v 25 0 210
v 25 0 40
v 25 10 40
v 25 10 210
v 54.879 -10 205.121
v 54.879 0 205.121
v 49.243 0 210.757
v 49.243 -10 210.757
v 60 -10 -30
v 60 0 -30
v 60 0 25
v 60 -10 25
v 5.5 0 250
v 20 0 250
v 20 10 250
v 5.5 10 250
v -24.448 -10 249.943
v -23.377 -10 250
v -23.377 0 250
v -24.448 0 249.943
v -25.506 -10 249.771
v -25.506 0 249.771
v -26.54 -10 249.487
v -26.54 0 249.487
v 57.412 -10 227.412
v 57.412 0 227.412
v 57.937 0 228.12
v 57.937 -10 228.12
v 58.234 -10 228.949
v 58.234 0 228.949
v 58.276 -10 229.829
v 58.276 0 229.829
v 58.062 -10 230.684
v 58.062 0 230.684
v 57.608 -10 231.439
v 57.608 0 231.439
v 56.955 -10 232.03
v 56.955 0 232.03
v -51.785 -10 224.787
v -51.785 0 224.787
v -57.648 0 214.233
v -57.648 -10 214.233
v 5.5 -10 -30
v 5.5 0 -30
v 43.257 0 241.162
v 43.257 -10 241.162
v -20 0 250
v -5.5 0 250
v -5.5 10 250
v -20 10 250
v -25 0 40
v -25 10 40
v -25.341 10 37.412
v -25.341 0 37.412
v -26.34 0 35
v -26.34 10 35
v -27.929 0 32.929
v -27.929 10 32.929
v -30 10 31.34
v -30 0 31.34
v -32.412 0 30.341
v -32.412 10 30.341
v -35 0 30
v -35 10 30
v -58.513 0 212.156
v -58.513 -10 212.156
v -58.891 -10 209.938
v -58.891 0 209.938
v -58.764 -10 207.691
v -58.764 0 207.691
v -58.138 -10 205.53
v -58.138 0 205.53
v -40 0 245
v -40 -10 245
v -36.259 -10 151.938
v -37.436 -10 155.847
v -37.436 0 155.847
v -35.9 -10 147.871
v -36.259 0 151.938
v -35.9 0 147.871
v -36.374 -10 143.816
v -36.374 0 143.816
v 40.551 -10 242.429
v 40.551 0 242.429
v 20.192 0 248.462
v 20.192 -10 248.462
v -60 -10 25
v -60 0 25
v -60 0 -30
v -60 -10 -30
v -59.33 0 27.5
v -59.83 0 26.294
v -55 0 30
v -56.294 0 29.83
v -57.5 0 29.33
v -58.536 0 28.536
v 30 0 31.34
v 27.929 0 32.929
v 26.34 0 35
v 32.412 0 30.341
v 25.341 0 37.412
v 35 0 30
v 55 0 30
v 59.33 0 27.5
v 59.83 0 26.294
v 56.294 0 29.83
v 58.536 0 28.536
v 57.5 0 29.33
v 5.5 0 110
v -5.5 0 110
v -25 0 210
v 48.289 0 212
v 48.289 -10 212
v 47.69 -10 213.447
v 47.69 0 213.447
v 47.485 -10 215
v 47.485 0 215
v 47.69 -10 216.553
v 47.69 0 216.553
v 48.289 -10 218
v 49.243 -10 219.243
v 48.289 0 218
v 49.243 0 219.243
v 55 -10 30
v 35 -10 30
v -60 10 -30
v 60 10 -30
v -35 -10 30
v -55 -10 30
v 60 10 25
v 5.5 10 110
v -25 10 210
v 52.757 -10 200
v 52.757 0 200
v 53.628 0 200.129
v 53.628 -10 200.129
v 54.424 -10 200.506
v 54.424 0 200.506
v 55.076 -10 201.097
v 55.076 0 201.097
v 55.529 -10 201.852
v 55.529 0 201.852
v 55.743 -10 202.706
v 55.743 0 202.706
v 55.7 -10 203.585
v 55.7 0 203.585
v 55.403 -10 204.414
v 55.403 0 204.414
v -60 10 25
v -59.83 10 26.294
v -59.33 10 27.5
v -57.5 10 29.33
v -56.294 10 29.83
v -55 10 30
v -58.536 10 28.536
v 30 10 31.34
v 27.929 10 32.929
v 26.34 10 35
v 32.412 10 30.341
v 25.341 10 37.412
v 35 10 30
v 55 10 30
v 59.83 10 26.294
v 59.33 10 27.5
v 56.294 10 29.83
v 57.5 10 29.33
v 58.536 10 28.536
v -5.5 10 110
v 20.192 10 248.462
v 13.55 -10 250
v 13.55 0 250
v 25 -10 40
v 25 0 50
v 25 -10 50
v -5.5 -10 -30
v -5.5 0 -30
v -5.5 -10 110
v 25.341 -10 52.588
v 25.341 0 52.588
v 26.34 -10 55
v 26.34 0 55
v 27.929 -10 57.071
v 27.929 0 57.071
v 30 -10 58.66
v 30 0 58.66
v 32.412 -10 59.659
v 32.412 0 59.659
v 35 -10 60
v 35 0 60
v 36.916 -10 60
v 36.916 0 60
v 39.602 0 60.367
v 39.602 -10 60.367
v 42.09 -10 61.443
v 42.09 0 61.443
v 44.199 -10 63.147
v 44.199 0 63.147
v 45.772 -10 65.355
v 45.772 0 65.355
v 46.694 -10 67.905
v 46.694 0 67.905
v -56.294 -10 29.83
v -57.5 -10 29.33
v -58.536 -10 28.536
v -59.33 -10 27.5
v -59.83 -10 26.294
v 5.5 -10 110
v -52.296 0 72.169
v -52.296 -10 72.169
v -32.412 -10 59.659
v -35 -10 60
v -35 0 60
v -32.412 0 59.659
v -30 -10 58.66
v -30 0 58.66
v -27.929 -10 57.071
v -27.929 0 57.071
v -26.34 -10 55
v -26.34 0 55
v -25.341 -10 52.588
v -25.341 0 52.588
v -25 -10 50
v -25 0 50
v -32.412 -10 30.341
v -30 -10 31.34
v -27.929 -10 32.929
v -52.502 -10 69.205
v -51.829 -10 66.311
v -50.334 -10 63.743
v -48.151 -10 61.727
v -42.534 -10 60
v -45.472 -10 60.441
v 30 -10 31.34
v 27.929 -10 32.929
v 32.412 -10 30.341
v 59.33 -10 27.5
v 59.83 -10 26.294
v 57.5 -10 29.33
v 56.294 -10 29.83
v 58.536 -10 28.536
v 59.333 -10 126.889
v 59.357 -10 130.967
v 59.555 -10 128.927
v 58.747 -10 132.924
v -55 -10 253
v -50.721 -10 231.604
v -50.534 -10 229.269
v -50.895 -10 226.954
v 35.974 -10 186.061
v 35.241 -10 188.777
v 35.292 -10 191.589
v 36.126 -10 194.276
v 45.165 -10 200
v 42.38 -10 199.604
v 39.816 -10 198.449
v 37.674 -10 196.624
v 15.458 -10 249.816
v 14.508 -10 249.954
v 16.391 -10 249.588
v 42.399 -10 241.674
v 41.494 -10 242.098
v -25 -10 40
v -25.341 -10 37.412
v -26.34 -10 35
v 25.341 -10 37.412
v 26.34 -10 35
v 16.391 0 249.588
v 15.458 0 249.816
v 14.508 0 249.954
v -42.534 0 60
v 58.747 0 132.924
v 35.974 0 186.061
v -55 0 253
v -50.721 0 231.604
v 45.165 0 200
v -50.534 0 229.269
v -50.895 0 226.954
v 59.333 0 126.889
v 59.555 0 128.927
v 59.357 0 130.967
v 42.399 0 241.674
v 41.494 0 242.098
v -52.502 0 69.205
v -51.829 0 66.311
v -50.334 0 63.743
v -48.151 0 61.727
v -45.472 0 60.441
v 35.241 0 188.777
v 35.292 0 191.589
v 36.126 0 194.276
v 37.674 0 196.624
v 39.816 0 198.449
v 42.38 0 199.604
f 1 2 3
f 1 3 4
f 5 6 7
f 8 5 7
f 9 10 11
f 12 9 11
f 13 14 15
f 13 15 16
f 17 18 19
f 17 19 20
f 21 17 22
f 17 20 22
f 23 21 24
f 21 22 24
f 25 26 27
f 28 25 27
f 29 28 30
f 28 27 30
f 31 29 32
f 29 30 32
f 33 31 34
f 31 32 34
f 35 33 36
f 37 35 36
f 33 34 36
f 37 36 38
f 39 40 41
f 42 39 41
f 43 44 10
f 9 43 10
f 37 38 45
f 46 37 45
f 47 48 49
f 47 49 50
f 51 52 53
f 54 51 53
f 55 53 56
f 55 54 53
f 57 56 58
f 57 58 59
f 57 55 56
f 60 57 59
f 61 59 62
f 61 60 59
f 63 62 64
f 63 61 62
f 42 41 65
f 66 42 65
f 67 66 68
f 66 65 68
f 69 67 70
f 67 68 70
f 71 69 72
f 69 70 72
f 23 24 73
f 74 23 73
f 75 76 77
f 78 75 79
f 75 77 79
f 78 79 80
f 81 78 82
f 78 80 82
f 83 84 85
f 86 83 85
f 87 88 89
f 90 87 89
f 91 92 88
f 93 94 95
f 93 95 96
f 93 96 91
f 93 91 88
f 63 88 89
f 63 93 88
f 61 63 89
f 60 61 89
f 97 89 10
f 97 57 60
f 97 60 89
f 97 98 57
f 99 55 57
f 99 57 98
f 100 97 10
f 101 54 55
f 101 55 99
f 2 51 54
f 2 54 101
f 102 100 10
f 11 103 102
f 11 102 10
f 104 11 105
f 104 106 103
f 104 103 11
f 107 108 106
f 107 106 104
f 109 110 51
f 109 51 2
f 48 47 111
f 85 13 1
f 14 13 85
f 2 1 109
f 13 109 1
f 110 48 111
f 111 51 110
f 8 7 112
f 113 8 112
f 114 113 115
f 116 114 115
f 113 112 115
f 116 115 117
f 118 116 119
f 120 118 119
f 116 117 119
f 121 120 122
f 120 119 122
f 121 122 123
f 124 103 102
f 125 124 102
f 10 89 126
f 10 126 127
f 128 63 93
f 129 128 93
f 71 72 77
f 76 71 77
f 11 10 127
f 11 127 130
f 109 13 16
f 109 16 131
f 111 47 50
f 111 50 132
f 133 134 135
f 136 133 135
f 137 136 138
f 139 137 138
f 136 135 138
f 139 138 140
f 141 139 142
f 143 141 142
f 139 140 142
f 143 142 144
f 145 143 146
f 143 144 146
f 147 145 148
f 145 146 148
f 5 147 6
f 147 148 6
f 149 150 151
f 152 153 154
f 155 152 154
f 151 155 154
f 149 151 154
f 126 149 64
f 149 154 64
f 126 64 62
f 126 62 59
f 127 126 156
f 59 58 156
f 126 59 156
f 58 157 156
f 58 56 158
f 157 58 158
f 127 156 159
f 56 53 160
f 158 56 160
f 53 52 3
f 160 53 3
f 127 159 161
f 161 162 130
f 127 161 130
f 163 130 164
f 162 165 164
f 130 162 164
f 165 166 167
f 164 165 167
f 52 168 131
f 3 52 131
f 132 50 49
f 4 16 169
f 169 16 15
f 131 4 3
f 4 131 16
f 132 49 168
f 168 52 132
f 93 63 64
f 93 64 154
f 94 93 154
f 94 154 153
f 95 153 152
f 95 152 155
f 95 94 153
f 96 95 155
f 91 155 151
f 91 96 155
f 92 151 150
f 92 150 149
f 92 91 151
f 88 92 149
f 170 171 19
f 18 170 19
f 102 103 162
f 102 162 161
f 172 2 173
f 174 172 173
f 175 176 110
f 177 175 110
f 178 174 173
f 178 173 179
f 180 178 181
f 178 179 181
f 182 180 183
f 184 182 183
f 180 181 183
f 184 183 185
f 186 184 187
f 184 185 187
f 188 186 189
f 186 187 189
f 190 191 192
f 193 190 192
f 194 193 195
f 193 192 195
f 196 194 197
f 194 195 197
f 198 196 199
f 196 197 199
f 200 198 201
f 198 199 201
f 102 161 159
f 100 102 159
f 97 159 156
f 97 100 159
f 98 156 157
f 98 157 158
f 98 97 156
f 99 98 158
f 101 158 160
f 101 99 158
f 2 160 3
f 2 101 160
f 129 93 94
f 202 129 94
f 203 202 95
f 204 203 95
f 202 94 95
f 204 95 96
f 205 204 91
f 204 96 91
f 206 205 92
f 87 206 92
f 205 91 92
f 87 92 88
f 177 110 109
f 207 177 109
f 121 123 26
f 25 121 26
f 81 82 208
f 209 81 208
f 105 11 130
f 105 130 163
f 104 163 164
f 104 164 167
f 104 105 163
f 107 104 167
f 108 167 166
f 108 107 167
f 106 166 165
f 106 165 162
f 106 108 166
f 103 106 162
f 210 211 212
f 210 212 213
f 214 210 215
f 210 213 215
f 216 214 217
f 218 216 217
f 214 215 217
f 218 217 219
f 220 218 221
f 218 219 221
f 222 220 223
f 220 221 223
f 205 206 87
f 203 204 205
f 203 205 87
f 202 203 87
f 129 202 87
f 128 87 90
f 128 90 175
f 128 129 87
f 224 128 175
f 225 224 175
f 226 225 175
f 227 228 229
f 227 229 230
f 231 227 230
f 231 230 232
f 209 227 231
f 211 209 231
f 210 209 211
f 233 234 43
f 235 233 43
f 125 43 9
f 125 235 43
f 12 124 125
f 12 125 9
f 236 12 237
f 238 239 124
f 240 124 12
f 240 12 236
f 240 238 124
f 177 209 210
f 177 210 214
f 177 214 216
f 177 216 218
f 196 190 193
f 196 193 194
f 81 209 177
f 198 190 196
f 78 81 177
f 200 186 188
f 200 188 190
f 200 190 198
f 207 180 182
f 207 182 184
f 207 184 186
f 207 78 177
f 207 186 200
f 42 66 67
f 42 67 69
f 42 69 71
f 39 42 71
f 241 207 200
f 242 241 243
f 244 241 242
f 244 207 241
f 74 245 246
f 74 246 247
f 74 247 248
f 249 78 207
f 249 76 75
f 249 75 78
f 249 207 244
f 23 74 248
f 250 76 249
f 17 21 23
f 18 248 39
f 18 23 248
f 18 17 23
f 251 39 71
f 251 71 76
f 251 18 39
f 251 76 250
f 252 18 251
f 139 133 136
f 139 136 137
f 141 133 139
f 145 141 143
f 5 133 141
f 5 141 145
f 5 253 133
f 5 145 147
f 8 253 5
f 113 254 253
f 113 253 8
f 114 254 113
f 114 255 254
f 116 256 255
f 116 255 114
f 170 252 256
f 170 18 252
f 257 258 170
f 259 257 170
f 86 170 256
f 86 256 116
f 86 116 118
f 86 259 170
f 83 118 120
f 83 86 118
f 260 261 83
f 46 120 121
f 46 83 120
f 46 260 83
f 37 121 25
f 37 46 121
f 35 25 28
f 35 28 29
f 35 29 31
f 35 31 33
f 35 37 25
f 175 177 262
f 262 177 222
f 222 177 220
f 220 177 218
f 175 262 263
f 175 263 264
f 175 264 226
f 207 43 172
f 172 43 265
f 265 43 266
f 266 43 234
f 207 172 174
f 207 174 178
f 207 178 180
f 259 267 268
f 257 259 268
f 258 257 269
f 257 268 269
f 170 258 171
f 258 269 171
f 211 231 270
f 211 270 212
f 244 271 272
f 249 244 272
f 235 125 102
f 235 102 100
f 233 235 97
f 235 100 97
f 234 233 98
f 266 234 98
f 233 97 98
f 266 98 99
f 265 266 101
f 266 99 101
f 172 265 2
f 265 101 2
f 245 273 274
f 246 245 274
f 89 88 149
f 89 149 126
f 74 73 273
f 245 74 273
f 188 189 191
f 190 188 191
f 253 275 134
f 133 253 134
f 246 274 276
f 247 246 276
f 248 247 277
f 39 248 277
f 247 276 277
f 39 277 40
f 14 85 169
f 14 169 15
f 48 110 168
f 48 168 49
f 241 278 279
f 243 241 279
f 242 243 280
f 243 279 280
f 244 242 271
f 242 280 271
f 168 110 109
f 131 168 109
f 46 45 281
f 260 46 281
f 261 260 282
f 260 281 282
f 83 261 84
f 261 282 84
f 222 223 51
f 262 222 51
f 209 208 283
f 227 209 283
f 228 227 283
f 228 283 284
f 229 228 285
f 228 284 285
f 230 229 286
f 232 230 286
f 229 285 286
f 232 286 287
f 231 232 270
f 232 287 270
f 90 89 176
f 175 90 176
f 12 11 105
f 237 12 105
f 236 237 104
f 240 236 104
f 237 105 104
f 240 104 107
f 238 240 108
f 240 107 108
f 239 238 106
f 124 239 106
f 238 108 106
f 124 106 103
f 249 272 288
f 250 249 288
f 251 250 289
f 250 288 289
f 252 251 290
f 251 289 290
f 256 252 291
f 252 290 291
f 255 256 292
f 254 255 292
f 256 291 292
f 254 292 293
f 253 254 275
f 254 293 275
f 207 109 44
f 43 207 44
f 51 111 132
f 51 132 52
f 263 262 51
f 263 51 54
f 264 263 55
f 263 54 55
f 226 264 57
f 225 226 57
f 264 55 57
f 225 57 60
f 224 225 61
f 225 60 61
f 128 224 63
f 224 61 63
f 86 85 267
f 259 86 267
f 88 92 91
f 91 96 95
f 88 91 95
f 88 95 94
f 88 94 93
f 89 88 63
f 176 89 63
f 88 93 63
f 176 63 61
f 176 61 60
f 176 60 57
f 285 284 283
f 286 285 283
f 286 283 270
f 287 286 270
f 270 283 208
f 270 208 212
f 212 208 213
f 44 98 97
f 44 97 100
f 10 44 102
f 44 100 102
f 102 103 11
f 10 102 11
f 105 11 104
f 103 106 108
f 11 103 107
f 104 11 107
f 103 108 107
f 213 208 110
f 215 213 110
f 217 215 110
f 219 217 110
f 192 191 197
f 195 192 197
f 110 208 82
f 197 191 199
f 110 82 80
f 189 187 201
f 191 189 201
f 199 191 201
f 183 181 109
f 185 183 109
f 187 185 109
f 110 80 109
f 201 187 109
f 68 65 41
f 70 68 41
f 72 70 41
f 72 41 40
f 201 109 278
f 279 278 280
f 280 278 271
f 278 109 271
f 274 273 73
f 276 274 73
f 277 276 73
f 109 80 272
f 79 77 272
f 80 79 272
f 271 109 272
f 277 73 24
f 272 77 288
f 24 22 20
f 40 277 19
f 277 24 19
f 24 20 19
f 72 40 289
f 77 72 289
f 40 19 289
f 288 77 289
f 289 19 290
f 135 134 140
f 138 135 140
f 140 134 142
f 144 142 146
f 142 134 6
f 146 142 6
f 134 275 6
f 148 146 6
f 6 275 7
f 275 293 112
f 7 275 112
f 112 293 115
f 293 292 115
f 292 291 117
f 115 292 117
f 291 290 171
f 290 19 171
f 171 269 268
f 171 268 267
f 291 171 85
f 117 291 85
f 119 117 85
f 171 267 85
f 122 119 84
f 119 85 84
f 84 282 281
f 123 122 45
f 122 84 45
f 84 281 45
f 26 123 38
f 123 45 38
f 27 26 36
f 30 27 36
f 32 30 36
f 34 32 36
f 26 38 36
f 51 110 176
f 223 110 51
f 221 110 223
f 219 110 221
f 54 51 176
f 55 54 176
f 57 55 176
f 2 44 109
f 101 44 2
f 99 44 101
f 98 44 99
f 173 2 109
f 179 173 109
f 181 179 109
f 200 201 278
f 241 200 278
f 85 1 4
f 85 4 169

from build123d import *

# Parameters (mm, degrees)
F0_W     = 11
F0_H     = 140
F1_DEPTH = 10
F2_DEPTH = 10


with BuildPart() as f1:
    # F0 (on Front) → F1 (new body)
    with BuildSketch(Plane.XZ):
        with BuildLine():
            Line((25, 210), (25, 50))
            ThreePointArc((25, 50), (27.9289321881, 57.0710678119), (35, 60))
            Line((35, 60), (36.9158420977, 60))
            ThreePointArc((36.9158420977, 60), (43.202617548, 62.2233391204), (46.6938662384, 67.9047091127))
            Line((46.6938662384, 67.9047091127), (59.3334554888, 126.8894589477))
            ThreePointArc((59.3334554888, 126.8894589477), (59.5085207702, 129.9522264264), (58.7468816482, 132.9239428208))
            Line((58.7468816482, 132.9239428208), (35.9739398511, 186.0608070142))
            ThreePointArc((35.9739398511, 186.0608070142), (36.8169792289, 195.5049100875), (45.1653901512, 200))
            Line((45.1653901512, 200), (52.7573593129, 200))
            ThreePointArc((52.7573593129, 200), (55.5289979104, 201.8519497029), (54.8786796564, 205.1213203436))
            Line((54.8786796564, 205.1213203436), (49.2426406871, 210.7573593129))
            ThreePointArc((49.2426406871, 210.7573593129), (47.4852813742, 215), (49.2426406871, 219.2426406871))
            Line((49.2426406871, 219.2426406871), (57.412405166, 227.412405166))
            ThreePointArc((57.412405166, 227.412405166), (58.2764848025, 229.8293383635), (56.9551854111, 232.0298763926))
            Line((56.9551854111, 232.0298763926), (43.2572961637, 241.1618025575))
            ThreePointArc((43.2572961637, 241.1618025575), (41.951848164, 241.8971938264), (40.5511774984, 242.4292807412))
            Line((40.5511774984, 242.4292807412), (20.1923076923, 248.4615384615))
            Line((20.1923076923, 248.4615384615), (25, 210))
        make_face()
        with BuildLine():
            Line((-25, 210), (-20, 250))
            Line((-20, 250), (-23.3772233983, 250))
            ThreePointArc((-23.3772233983, 250), (-24.9790458284, 249.8708745764), (-26.5395010585, 249.4868329805))
            Line((-26.5395010585, 249.4868329805), (-40, 245))
            Line((-40, 245), (-55, 253))
            Line((-55, 253), (-50.7208778634, 231.6043893169))
            ThreePointArc((-50.7208778634, 231.6043893169), (-50.6463401243, 228.1008944607), (-51.7851118591, 224.7867986537))
            Line((-51.7851118591, 224.7867986537), (-57.6484155512, 214.2328520078))
            ThreePointArc((-57.6484155512, 214.2328520078), (-58.8910807466, 209.9376645562), (-58.1376120208, 205.5302688499))
            Line((-58.1376120208, 205.5302688499), (-37.4363520563, 155.8472449351))
            ThreePointArc((-37.4363520563, 155.8472449351), (-35.9753879675, 149.9138835563), (-36.3741493141, 143.8163280864))
            Line((-36.3741493141, 143.8163280864), (-52.2957100937, 72.1693045782))
            ThreePointArc((-52.2957100937, 72.1693045782), (-50.3342576147, 63.7427260641), (-42.5338394919, 60))
            Line((-42.5338394919, 60), (-35, 60))
            ThreePointArc((-35, 60), (-27.9289321881, 57.0710678119), (-25, 50))
            Line((-25, 50), (-25, 210))
        make_face()
        with BuildLine():
            Line((-60, -30), (-5.5, -30))
            Line((-5.5, -30), (-5.5, 110))
            Line((-5.5, 110), (-5.5, 250))
            Line((-5.5, 250), (-20, 250))
            Line((-20, 250), (-25, 210))
            Line((-25, 210), (-25, 50))
            Line((-25, 50), (-25, 40))
            ThreePointArc((-25, 40), (-27.9289321881, 32.9289321881), (-35, 30))
            Line((-35, 30), (-55, 30))
            ThreePointArc((-55, 30), (-58.5355339059, 28.5355339059), (-60, 25))
            Line((-60, 25), (-60, -30))
        make_face()
        with Locations((0, 180)):
            Rectangle(F0_W, F0_H)
        with BuildLine():
            ThreePointArc((60, 25), (58.5355339059, 28.5355339059), (55, 30))
            Line((55, 30), (35, 30))
            ThreePointArc((35, 30), (27.9289321881, 32.9289321881), (25, 40))
            Line((25, 40), (25, 50))
            Line((25, 50), (25, 210))
            Line((25, 210), (20.1923076923, 248.4615384615))
            Line((20.1923076923, 248.4615384615), (16.3905636961, 249.5879811271))
            ThreePointArc((16.3905636961, 249.5879811271), (14.9849832817, 249.8964592474), (13.5496803992, 250))
            Line((13.5496803992, 250), (5.5, 250))
            Line((5.5, 250), (5.5, 110))
            Line((5.5, 110), (5.5, -30))
            Line((5.5, -30), (60, -30))
            Line((60, -30), (60, 25))
        make_face()
    extrude(amount=F1_DEPTH)


with BuildPart() as f2:
    # F0 (on Front) → F2 (new body)
    with BuildSketch(Plane.XZ):
        with BuildLine():
            Line((-60, -30), (-5.5, -30))
            Line((-5.5, -30), (-5.5, 110))
            Line((-5.5, 110), (-5.5, 250))
            Line((-5.5, 250), (-20, 250))
            Line((-20, 250), (-25, 210))
            Line((-25, 210), (-25, 50))
            Line((-25, 50), (-25, 40))
            ThreePointArc((-25, 40), (-27.9289321881, 32.9289321881), (-35, 30))
            Line((-35, 30), (-55, 30))
            ThreePointArc((-55, 30), (-58.5355339059, 28.5355339059), (-60, 25))
            Line((-60, 25), (-60, -30))
        make_face()
        with BuildLine():
            ThreePointArc((60, 25), (58.5355339059, 28.5355339059), (55, 30))
            Line((55, 30), (35, 30))
            ThreePointArc((35, 30), (27.9289321881, 32.9289321881), (25, 40))
            Line((25, 40), (25, 50))
            Line((25, 50), (25, 210))
            Line((25, 210), (20.1923076923, 248.4615384615))
            Line((20.1923076923, 248.4615384615), (16.3905636961, 249.5879811271))
            ThreePointArc((16.3905636961, 249.5879811271), (14.9849832817, 249.8964592474), (13.5496803992, 250))
            Line((13.5496803992, 250), (5.5, 250))
            Line((5.5, 250), (5.5, 110))
            Line((5.5, 110), (5.5, -30))
            Line((5.5, -30), (60, -30))
            Line((60, -30), (60, 25))
        make_face()
        with Locations((0, 40)):
            Rectangle(F0_W, F0_H)
        with BuildLine():
            Line((16.3905636961, 249.5879811271), (20.1923076923, 248.4615384615))
            Line((20.1923076923, 248.4615384615), (20, 250))
            Line((20, 250), (13.5496803992, 250))
            ThreePointArc((13.5496803992, 250), (14.9849832817, 249.8964592474), (16.3905636961, 249.5879811271))
        make_face()
    extrude(amount=-F2_DEPTH)


solid = Compound([f1.part, f2.part])
